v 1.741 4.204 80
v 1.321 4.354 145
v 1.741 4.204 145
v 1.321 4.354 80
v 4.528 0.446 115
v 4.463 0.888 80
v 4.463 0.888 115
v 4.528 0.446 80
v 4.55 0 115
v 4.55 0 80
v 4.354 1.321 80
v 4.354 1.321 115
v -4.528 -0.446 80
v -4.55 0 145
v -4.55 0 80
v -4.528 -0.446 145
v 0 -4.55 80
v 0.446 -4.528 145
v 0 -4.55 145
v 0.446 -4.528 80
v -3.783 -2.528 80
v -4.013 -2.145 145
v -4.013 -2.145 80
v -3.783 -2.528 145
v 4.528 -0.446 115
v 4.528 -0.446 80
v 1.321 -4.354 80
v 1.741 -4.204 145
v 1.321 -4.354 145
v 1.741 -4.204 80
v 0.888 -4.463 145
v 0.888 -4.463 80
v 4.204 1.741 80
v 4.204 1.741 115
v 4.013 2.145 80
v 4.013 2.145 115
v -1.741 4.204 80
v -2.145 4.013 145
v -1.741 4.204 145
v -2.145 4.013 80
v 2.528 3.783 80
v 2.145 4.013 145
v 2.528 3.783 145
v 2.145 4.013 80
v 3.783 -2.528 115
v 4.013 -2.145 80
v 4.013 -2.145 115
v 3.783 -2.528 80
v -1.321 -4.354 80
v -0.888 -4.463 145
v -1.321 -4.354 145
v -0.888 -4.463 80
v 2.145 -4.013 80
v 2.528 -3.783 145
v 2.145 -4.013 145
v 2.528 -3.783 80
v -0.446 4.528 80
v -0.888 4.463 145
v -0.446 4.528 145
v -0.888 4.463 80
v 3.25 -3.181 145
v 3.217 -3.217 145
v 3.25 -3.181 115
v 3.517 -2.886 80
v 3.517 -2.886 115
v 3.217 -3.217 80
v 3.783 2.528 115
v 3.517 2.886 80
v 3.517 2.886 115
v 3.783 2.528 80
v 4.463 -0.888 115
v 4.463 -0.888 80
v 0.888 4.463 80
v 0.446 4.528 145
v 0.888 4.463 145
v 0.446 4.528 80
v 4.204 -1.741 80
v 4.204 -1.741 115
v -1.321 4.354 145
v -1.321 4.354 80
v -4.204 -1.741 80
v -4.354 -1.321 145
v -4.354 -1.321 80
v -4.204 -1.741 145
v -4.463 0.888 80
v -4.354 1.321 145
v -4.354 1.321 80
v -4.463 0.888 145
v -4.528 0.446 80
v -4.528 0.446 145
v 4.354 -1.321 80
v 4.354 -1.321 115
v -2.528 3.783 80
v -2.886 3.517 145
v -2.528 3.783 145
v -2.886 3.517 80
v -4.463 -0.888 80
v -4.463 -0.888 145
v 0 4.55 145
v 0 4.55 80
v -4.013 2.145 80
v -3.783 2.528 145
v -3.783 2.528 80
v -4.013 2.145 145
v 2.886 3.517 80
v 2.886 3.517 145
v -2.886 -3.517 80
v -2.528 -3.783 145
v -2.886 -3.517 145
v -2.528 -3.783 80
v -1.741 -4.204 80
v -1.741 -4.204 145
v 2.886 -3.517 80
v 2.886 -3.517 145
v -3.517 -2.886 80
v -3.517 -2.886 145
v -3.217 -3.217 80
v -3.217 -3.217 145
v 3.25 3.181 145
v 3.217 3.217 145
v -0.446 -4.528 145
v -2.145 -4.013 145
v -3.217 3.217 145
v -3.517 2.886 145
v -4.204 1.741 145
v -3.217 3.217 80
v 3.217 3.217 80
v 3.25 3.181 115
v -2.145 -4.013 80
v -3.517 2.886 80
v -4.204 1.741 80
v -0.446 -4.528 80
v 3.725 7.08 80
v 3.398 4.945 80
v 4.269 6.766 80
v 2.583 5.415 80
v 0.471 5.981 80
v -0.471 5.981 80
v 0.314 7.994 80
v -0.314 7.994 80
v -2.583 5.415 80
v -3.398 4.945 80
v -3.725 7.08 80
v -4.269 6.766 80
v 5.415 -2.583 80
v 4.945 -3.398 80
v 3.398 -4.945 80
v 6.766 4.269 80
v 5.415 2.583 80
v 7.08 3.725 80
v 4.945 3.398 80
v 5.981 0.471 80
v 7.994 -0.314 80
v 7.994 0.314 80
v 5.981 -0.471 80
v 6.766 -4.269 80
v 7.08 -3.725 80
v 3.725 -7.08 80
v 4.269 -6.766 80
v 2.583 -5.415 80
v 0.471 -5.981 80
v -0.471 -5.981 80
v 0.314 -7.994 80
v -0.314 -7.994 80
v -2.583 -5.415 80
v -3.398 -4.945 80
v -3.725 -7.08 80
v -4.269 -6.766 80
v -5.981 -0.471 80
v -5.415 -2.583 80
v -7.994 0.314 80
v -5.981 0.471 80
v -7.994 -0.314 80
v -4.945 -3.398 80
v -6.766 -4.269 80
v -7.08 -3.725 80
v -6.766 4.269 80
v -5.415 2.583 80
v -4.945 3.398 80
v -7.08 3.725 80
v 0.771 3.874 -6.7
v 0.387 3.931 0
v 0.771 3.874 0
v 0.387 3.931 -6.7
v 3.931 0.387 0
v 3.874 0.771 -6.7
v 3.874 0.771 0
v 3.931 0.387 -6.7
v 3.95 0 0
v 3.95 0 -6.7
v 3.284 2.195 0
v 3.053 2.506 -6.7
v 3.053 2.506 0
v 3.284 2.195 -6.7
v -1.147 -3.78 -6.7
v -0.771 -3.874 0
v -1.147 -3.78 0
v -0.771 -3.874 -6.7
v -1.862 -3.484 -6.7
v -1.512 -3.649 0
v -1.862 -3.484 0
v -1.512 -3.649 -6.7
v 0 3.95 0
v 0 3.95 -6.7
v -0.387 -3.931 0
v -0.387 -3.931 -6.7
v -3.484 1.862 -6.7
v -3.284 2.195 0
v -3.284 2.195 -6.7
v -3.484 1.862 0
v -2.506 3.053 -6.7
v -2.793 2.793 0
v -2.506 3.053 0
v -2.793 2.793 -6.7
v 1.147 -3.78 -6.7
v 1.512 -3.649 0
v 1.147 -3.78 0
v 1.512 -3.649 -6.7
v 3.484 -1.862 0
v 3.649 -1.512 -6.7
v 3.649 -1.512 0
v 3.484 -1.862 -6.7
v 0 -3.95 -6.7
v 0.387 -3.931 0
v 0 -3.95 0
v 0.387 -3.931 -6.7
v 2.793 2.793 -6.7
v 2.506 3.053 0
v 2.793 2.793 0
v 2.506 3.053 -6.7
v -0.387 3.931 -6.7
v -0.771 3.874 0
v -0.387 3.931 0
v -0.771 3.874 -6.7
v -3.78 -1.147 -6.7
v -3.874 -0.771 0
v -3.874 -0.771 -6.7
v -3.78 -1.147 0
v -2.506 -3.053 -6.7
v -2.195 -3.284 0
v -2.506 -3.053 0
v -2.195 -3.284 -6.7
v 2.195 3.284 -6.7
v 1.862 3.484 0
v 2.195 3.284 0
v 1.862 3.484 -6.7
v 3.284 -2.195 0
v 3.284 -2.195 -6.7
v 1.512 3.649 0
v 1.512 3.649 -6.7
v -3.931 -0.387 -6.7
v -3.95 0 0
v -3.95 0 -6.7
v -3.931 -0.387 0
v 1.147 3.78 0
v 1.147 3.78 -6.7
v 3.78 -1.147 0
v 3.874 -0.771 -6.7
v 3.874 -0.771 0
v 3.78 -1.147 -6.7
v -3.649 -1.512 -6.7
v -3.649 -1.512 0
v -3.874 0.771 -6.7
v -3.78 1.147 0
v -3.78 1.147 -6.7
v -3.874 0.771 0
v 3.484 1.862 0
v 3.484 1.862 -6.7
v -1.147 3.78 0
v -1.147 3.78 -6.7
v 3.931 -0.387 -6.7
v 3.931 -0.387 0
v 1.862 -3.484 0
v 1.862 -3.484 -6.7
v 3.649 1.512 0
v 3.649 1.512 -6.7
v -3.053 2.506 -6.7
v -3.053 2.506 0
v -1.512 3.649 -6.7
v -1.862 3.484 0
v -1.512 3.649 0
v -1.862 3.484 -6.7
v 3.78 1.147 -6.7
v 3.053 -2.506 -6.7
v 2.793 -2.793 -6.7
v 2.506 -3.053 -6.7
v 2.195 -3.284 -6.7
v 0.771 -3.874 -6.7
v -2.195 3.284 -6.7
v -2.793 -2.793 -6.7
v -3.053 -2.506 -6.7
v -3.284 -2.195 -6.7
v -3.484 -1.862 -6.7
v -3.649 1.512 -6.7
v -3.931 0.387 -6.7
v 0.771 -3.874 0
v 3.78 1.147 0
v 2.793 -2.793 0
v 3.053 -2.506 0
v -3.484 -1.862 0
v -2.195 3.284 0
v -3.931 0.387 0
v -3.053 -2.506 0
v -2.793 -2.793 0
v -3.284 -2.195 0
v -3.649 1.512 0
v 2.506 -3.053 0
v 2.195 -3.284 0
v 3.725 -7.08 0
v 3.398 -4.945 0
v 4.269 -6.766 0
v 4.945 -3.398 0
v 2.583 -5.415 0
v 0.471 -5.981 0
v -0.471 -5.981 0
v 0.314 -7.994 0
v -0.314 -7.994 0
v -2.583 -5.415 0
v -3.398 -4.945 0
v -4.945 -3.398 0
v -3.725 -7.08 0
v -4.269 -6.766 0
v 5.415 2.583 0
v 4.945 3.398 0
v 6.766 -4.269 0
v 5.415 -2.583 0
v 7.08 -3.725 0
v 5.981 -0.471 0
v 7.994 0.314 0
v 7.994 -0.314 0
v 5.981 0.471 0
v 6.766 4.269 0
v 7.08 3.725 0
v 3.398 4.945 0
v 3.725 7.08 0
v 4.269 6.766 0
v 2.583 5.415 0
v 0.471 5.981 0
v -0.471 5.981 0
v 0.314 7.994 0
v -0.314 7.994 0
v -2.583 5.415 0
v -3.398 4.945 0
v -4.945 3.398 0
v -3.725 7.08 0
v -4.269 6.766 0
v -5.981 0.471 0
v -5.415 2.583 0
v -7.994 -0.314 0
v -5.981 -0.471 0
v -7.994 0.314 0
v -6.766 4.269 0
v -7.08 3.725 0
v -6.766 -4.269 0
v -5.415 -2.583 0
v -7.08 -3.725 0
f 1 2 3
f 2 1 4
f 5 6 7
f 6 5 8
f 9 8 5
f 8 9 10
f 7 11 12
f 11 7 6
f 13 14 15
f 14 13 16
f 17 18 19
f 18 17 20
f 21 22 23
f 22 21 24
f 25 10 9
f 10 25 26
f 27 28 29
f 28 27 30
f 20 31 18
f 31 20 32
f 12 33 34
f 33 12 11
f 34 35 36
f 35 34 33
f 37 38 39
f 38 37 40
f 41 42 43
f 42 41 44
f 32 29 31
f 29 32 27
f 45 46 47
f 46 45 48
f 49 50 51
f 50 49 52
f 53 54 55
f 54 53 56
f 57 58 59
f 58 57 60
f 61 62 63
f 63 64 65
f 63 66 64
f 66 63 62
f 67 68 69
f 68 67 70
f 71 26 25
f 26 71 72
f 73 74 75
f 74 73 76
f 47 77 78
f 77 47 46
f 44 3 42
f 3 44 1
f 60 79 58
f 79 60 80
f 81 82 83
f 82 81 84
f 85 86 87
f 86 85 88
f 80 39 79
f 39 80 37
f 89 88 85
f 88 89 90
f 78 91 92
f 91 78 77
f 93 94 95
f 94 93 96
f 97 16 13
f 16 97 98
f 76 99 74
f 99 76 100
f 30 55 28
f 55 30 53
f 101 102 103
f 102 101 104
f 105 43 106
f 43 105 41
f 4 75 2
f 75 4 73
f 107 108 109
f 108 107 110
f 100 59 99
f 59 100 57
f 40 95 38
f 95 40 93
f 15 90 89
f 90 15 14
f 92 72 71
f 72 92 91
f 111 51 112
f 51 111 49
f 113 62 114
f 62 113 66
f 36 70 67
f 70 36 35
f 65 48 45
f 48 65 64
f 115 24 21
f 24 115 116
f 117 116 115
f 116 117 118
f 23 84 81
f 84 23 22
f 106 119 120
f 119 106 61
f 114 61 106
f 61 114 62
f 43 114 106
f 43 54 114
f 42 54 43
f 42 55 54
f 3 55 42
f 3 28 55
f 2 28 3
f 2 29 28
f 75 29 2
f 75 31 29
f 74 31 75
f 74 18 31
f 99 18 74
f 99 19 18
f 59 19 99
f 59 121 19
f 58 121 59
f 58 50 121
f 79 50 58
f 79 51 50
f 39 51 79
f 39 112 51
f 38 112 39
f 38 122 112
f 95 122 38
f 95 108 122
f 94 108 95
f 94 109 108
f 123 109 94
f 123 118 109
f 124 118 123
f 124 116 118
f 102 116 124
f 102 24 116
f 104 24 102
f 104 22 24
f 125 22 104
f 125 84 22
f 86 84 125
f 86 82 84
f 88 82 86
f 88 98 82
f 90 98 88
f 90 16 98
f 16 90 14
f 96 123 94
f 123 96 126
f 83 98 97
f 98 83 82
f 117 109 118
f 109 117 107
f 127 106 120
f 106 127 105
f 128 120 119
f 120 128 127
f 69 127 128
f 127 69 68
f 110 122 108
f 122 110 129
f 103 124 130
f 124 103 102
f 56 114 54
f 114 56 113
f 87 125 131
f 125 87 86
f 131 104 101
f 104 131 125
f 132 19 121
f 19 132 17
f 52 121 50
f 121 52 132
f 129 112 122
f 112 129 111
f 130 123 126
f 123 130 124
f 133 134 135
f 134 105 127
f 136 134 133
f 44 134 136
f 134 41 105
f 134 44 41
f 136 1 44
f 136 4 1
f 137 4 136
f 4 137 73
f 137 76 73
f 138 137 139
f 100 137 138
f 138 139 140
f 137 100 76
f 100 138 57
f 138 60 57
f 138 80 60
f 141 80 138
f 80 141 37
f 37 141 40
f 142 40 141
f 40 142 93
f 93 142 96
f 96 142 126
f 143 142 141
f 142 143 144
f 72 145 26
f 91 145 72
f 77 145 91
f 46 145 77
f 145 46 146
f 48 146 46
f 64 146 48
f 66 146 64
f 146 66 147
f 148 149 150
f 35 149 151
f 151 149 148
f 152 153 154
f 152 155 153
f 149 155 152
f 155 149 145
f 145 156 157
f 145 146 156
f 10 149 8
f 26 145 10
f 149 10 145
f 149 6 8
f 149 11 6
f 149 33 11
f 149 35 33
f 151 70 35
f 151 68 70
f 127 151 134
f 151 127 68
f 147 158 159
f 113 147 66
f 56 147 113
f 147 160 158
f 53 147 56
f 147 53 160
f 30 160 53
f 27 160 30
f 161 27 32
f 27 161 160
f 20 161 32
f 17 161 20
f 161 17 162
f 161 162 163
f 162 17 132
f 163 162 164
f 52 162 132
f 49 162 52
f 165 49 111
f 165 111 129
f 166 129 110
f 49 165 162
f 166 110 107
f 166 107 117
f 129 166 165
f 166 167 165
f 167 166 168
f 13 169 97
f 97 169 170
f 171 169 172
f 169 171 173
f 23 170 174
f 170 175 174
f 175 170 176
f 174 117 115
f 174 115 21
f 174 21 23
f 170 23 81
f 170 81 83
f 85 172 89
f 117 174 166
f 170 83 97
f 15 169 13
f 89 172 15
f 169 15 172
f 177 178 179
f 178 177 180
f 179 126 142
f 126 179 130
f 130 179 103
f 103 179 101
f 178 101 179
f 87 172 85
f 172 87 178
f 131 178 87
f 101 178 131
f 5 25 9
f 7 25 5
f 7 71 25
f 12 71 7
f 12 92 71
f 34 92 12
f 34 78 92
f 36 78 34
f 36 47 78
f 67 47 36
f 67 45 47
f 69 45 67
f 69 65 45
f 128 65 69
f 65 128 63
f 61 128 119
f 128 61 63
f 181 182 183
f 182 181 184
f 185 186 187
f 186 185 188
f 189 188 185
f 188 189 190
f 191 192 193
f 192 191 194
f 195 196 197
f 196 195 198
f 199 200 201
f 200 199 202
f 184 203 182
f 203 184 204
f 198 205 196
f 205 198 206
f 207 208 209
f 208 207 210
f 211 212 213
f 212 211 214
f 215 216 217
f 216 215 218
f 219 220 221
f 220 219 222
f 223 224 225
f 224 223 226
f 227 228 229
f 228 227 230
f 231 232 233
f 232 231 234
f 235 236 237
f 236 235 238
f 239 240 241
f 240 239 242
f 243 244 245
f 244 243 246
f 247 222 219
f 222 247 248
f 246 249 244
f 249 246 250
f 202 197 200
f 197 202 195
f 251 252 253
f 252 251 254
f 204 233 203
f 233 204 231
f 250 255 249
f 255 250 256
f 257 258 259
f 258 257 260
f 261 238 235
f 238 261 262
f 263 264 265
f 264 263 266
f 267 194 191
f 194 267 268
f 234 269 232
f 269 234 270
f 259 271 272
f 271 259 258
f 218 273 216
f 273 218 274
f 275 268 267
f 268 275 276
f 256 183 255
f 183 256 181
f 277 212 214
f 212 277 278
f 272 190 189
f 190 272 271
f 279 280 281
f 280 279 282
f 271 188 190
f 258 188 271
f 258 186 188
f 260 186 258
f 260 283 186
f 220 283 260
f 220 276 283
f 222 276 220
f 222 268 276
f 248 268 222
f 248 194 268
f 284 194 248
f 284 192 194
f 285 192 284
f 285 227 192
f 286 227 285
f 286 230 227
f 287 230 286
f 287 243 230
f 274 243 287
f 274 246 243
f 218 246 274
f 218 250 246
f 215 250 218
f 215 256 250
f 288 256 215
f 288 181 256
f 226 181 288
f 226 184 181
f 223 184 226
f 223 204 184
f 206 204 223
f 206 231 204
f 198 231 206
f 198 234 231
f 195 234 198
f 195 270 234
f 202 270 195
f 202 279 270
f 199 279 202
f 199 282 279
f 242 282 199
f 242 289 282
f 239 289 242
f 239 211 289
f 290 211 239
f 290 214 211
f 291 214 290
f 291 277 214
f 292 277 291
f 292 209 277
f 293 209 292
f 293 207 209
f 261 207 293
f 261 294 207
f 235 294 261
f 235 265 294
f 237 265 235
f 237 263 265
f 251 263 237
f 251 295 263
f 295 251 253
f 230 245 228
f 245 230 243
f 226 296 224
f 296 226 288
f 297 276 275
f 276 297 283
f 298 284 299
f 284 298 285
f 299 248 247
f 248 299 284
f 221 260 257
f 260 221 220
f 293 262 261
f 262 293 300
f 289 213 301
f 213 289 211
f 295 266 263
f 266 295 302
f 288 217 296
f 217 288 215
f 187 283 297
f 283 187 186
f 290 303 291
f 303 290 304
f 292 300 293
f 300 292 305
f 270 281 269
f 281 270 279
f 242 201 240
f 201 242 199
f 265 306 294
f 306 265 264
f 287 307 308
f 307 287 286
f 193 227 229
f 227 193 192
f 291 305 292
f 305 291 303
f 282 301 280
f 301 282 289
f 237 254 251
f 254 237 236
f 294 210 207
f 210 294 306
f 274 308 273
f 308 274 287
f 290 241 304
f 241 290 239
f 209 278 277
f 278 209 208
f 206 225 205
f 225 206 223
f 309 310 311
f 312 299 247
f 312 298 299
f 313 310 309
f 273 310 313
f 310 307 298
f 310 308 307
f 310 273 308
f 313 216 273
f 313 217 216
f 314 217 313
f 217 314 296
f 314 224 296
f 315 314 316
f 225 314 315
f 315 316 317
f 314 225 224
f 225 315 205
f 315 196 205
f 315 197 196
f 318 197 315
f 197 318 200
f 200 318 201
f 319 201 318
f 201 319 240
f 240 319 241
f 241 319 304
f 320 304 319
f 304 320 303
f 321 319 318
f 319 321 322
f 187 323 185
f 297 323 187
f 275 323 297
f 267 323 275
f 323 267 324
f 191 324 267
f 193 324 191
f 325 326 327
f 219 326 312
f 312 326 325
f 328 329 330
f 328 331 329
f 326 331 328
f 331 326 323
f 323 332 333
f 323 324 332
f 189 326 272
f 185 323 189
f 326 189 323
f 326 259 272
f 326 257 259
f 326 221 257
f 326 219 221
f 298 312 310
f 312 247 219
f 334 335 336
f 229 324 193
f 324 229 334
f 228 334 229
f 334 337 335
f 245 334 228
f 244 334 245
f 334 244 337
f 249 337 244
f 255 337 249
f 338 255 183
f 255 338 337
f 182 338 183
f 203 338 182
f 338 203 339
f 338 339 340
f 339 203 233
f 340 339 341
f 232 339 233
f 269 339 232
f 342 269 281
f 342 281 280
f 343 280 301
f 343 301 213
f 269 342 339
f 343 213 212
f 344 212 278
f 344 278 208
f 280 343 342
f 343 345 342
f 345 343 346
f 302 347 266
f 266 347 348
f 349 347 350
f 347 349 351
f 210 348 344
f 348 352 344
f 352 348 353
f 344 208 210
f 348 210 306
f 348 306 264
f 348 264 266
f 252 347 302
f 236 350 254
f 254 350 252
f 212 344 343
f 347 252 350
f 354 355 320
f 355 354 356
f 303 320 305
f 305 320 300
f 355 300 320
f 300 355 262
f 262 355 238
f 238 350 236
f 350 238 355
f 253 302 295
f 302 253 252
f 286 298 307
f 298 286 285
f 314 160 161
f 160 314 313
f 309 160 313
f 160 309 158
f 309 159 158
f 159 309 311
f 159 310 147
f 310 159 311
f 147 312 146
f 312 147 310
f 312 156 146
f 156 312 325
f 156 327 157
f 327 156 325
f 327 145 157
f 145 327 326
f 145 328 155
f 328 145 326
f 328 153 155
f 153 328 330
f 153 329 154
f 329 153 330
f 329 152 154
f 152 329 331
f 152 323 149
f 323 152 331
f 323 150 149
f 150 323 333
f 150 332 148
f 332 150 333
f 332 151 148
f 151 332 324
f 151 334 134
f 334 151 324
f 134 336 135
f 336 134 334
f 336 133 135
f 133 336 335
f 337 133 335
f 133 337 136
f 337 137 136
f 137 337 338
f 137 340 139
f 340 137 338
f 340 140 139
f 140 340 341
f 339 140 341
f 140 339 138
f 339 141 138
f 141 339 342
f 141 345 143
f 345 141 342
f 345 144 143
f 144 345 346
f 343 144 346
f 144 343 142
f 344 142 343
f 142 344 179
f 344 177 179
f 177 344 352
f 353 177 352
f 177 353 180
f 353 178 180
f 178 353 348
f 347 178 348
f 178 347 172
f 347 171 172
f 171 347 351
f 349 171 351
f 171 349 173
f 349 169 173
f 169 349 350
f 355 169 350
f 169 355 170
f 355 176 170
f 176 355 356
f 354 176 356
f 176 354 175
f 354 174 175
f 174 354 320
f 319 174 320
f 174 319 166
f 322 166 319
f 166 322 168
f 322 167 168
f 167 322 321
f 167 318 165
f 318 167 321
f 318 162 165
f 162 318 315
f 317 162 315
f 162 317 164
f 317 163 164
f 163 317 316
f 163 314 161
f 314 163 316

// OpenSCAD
// FILE: 03_Gear_Rod_D_Cut_V8.8.scad
// UPDATED: Bottom pin diameter = 7.9mm, length = 6.7mm to match bearing dimensions.
// NOTE: Slicing/printer calibration factors ignored per request.

$fn = 64;
h = 140;        // Total height
th = 80;        // Gear teeth height
d_cut_h = 30;   // Mast engagement depth
rod_dia = 9.5;

bottom_pin_dia = 7.9; // 7.9mm (0.31") for 8mm ID bottom bearing
bottom_pin_h   = 6.7; // 6.7mm depth matching your physical bearing height
top_pin_dia    = 9.1; // Nominal 9.4mm for a 10mm ID top bearing

// 1. Bottom Bearing Pin (Fits into Chassis Podium)
translate([0, 0, -bottom_pin_h]) cylinder(h = bottom_pin_h, d = bottom_pin_dia);

// 2. Gear Teeth (12 teeth)
linear_extrude(height = th) gear_profile(12, 8, 6);

// 3. Top Section (Lid bearing interface and D-cut)
translate([0, 0, th]) {
    difference() {
        // This cylinder passes through the Lid bearing
        cylinder(h = h - th + 5, d = top_pin_dia);
        
        // The D-cut: Standard flat for mast orientation
        translate([rod_dia/2 - 1.5, -5, h - th - d_cut_h + 5]) 
            cube([5, 10, d_cut_h + 1]);
    }
}

module gear_profile(teeth, r_out, r_in, flat=0.6) {
    angle_step = 360/teeth;
    points = [for (i = [0:teeth-1]) each [
        [r_in*cos(i*angle_step-angle_step*flat/4), r_in*sin(i*angle_step-angle_step*flat/4)],
        [r_out*cos(i*angle_step-angle_step*flat/8), r_out*sin(i*angle_step-angle_step*flat/8)],
        [r_out*cos(i*angle_step+angle_step*flat/8), r_out*sin(i*angle_step+angle_step*flat/8)],
        [r_in*cos(i*angle_step+angle_step*flat/4), r_in*sin(i*angle_step+angle_step*flat/4)]
    ]];
    polygon(points);
}
